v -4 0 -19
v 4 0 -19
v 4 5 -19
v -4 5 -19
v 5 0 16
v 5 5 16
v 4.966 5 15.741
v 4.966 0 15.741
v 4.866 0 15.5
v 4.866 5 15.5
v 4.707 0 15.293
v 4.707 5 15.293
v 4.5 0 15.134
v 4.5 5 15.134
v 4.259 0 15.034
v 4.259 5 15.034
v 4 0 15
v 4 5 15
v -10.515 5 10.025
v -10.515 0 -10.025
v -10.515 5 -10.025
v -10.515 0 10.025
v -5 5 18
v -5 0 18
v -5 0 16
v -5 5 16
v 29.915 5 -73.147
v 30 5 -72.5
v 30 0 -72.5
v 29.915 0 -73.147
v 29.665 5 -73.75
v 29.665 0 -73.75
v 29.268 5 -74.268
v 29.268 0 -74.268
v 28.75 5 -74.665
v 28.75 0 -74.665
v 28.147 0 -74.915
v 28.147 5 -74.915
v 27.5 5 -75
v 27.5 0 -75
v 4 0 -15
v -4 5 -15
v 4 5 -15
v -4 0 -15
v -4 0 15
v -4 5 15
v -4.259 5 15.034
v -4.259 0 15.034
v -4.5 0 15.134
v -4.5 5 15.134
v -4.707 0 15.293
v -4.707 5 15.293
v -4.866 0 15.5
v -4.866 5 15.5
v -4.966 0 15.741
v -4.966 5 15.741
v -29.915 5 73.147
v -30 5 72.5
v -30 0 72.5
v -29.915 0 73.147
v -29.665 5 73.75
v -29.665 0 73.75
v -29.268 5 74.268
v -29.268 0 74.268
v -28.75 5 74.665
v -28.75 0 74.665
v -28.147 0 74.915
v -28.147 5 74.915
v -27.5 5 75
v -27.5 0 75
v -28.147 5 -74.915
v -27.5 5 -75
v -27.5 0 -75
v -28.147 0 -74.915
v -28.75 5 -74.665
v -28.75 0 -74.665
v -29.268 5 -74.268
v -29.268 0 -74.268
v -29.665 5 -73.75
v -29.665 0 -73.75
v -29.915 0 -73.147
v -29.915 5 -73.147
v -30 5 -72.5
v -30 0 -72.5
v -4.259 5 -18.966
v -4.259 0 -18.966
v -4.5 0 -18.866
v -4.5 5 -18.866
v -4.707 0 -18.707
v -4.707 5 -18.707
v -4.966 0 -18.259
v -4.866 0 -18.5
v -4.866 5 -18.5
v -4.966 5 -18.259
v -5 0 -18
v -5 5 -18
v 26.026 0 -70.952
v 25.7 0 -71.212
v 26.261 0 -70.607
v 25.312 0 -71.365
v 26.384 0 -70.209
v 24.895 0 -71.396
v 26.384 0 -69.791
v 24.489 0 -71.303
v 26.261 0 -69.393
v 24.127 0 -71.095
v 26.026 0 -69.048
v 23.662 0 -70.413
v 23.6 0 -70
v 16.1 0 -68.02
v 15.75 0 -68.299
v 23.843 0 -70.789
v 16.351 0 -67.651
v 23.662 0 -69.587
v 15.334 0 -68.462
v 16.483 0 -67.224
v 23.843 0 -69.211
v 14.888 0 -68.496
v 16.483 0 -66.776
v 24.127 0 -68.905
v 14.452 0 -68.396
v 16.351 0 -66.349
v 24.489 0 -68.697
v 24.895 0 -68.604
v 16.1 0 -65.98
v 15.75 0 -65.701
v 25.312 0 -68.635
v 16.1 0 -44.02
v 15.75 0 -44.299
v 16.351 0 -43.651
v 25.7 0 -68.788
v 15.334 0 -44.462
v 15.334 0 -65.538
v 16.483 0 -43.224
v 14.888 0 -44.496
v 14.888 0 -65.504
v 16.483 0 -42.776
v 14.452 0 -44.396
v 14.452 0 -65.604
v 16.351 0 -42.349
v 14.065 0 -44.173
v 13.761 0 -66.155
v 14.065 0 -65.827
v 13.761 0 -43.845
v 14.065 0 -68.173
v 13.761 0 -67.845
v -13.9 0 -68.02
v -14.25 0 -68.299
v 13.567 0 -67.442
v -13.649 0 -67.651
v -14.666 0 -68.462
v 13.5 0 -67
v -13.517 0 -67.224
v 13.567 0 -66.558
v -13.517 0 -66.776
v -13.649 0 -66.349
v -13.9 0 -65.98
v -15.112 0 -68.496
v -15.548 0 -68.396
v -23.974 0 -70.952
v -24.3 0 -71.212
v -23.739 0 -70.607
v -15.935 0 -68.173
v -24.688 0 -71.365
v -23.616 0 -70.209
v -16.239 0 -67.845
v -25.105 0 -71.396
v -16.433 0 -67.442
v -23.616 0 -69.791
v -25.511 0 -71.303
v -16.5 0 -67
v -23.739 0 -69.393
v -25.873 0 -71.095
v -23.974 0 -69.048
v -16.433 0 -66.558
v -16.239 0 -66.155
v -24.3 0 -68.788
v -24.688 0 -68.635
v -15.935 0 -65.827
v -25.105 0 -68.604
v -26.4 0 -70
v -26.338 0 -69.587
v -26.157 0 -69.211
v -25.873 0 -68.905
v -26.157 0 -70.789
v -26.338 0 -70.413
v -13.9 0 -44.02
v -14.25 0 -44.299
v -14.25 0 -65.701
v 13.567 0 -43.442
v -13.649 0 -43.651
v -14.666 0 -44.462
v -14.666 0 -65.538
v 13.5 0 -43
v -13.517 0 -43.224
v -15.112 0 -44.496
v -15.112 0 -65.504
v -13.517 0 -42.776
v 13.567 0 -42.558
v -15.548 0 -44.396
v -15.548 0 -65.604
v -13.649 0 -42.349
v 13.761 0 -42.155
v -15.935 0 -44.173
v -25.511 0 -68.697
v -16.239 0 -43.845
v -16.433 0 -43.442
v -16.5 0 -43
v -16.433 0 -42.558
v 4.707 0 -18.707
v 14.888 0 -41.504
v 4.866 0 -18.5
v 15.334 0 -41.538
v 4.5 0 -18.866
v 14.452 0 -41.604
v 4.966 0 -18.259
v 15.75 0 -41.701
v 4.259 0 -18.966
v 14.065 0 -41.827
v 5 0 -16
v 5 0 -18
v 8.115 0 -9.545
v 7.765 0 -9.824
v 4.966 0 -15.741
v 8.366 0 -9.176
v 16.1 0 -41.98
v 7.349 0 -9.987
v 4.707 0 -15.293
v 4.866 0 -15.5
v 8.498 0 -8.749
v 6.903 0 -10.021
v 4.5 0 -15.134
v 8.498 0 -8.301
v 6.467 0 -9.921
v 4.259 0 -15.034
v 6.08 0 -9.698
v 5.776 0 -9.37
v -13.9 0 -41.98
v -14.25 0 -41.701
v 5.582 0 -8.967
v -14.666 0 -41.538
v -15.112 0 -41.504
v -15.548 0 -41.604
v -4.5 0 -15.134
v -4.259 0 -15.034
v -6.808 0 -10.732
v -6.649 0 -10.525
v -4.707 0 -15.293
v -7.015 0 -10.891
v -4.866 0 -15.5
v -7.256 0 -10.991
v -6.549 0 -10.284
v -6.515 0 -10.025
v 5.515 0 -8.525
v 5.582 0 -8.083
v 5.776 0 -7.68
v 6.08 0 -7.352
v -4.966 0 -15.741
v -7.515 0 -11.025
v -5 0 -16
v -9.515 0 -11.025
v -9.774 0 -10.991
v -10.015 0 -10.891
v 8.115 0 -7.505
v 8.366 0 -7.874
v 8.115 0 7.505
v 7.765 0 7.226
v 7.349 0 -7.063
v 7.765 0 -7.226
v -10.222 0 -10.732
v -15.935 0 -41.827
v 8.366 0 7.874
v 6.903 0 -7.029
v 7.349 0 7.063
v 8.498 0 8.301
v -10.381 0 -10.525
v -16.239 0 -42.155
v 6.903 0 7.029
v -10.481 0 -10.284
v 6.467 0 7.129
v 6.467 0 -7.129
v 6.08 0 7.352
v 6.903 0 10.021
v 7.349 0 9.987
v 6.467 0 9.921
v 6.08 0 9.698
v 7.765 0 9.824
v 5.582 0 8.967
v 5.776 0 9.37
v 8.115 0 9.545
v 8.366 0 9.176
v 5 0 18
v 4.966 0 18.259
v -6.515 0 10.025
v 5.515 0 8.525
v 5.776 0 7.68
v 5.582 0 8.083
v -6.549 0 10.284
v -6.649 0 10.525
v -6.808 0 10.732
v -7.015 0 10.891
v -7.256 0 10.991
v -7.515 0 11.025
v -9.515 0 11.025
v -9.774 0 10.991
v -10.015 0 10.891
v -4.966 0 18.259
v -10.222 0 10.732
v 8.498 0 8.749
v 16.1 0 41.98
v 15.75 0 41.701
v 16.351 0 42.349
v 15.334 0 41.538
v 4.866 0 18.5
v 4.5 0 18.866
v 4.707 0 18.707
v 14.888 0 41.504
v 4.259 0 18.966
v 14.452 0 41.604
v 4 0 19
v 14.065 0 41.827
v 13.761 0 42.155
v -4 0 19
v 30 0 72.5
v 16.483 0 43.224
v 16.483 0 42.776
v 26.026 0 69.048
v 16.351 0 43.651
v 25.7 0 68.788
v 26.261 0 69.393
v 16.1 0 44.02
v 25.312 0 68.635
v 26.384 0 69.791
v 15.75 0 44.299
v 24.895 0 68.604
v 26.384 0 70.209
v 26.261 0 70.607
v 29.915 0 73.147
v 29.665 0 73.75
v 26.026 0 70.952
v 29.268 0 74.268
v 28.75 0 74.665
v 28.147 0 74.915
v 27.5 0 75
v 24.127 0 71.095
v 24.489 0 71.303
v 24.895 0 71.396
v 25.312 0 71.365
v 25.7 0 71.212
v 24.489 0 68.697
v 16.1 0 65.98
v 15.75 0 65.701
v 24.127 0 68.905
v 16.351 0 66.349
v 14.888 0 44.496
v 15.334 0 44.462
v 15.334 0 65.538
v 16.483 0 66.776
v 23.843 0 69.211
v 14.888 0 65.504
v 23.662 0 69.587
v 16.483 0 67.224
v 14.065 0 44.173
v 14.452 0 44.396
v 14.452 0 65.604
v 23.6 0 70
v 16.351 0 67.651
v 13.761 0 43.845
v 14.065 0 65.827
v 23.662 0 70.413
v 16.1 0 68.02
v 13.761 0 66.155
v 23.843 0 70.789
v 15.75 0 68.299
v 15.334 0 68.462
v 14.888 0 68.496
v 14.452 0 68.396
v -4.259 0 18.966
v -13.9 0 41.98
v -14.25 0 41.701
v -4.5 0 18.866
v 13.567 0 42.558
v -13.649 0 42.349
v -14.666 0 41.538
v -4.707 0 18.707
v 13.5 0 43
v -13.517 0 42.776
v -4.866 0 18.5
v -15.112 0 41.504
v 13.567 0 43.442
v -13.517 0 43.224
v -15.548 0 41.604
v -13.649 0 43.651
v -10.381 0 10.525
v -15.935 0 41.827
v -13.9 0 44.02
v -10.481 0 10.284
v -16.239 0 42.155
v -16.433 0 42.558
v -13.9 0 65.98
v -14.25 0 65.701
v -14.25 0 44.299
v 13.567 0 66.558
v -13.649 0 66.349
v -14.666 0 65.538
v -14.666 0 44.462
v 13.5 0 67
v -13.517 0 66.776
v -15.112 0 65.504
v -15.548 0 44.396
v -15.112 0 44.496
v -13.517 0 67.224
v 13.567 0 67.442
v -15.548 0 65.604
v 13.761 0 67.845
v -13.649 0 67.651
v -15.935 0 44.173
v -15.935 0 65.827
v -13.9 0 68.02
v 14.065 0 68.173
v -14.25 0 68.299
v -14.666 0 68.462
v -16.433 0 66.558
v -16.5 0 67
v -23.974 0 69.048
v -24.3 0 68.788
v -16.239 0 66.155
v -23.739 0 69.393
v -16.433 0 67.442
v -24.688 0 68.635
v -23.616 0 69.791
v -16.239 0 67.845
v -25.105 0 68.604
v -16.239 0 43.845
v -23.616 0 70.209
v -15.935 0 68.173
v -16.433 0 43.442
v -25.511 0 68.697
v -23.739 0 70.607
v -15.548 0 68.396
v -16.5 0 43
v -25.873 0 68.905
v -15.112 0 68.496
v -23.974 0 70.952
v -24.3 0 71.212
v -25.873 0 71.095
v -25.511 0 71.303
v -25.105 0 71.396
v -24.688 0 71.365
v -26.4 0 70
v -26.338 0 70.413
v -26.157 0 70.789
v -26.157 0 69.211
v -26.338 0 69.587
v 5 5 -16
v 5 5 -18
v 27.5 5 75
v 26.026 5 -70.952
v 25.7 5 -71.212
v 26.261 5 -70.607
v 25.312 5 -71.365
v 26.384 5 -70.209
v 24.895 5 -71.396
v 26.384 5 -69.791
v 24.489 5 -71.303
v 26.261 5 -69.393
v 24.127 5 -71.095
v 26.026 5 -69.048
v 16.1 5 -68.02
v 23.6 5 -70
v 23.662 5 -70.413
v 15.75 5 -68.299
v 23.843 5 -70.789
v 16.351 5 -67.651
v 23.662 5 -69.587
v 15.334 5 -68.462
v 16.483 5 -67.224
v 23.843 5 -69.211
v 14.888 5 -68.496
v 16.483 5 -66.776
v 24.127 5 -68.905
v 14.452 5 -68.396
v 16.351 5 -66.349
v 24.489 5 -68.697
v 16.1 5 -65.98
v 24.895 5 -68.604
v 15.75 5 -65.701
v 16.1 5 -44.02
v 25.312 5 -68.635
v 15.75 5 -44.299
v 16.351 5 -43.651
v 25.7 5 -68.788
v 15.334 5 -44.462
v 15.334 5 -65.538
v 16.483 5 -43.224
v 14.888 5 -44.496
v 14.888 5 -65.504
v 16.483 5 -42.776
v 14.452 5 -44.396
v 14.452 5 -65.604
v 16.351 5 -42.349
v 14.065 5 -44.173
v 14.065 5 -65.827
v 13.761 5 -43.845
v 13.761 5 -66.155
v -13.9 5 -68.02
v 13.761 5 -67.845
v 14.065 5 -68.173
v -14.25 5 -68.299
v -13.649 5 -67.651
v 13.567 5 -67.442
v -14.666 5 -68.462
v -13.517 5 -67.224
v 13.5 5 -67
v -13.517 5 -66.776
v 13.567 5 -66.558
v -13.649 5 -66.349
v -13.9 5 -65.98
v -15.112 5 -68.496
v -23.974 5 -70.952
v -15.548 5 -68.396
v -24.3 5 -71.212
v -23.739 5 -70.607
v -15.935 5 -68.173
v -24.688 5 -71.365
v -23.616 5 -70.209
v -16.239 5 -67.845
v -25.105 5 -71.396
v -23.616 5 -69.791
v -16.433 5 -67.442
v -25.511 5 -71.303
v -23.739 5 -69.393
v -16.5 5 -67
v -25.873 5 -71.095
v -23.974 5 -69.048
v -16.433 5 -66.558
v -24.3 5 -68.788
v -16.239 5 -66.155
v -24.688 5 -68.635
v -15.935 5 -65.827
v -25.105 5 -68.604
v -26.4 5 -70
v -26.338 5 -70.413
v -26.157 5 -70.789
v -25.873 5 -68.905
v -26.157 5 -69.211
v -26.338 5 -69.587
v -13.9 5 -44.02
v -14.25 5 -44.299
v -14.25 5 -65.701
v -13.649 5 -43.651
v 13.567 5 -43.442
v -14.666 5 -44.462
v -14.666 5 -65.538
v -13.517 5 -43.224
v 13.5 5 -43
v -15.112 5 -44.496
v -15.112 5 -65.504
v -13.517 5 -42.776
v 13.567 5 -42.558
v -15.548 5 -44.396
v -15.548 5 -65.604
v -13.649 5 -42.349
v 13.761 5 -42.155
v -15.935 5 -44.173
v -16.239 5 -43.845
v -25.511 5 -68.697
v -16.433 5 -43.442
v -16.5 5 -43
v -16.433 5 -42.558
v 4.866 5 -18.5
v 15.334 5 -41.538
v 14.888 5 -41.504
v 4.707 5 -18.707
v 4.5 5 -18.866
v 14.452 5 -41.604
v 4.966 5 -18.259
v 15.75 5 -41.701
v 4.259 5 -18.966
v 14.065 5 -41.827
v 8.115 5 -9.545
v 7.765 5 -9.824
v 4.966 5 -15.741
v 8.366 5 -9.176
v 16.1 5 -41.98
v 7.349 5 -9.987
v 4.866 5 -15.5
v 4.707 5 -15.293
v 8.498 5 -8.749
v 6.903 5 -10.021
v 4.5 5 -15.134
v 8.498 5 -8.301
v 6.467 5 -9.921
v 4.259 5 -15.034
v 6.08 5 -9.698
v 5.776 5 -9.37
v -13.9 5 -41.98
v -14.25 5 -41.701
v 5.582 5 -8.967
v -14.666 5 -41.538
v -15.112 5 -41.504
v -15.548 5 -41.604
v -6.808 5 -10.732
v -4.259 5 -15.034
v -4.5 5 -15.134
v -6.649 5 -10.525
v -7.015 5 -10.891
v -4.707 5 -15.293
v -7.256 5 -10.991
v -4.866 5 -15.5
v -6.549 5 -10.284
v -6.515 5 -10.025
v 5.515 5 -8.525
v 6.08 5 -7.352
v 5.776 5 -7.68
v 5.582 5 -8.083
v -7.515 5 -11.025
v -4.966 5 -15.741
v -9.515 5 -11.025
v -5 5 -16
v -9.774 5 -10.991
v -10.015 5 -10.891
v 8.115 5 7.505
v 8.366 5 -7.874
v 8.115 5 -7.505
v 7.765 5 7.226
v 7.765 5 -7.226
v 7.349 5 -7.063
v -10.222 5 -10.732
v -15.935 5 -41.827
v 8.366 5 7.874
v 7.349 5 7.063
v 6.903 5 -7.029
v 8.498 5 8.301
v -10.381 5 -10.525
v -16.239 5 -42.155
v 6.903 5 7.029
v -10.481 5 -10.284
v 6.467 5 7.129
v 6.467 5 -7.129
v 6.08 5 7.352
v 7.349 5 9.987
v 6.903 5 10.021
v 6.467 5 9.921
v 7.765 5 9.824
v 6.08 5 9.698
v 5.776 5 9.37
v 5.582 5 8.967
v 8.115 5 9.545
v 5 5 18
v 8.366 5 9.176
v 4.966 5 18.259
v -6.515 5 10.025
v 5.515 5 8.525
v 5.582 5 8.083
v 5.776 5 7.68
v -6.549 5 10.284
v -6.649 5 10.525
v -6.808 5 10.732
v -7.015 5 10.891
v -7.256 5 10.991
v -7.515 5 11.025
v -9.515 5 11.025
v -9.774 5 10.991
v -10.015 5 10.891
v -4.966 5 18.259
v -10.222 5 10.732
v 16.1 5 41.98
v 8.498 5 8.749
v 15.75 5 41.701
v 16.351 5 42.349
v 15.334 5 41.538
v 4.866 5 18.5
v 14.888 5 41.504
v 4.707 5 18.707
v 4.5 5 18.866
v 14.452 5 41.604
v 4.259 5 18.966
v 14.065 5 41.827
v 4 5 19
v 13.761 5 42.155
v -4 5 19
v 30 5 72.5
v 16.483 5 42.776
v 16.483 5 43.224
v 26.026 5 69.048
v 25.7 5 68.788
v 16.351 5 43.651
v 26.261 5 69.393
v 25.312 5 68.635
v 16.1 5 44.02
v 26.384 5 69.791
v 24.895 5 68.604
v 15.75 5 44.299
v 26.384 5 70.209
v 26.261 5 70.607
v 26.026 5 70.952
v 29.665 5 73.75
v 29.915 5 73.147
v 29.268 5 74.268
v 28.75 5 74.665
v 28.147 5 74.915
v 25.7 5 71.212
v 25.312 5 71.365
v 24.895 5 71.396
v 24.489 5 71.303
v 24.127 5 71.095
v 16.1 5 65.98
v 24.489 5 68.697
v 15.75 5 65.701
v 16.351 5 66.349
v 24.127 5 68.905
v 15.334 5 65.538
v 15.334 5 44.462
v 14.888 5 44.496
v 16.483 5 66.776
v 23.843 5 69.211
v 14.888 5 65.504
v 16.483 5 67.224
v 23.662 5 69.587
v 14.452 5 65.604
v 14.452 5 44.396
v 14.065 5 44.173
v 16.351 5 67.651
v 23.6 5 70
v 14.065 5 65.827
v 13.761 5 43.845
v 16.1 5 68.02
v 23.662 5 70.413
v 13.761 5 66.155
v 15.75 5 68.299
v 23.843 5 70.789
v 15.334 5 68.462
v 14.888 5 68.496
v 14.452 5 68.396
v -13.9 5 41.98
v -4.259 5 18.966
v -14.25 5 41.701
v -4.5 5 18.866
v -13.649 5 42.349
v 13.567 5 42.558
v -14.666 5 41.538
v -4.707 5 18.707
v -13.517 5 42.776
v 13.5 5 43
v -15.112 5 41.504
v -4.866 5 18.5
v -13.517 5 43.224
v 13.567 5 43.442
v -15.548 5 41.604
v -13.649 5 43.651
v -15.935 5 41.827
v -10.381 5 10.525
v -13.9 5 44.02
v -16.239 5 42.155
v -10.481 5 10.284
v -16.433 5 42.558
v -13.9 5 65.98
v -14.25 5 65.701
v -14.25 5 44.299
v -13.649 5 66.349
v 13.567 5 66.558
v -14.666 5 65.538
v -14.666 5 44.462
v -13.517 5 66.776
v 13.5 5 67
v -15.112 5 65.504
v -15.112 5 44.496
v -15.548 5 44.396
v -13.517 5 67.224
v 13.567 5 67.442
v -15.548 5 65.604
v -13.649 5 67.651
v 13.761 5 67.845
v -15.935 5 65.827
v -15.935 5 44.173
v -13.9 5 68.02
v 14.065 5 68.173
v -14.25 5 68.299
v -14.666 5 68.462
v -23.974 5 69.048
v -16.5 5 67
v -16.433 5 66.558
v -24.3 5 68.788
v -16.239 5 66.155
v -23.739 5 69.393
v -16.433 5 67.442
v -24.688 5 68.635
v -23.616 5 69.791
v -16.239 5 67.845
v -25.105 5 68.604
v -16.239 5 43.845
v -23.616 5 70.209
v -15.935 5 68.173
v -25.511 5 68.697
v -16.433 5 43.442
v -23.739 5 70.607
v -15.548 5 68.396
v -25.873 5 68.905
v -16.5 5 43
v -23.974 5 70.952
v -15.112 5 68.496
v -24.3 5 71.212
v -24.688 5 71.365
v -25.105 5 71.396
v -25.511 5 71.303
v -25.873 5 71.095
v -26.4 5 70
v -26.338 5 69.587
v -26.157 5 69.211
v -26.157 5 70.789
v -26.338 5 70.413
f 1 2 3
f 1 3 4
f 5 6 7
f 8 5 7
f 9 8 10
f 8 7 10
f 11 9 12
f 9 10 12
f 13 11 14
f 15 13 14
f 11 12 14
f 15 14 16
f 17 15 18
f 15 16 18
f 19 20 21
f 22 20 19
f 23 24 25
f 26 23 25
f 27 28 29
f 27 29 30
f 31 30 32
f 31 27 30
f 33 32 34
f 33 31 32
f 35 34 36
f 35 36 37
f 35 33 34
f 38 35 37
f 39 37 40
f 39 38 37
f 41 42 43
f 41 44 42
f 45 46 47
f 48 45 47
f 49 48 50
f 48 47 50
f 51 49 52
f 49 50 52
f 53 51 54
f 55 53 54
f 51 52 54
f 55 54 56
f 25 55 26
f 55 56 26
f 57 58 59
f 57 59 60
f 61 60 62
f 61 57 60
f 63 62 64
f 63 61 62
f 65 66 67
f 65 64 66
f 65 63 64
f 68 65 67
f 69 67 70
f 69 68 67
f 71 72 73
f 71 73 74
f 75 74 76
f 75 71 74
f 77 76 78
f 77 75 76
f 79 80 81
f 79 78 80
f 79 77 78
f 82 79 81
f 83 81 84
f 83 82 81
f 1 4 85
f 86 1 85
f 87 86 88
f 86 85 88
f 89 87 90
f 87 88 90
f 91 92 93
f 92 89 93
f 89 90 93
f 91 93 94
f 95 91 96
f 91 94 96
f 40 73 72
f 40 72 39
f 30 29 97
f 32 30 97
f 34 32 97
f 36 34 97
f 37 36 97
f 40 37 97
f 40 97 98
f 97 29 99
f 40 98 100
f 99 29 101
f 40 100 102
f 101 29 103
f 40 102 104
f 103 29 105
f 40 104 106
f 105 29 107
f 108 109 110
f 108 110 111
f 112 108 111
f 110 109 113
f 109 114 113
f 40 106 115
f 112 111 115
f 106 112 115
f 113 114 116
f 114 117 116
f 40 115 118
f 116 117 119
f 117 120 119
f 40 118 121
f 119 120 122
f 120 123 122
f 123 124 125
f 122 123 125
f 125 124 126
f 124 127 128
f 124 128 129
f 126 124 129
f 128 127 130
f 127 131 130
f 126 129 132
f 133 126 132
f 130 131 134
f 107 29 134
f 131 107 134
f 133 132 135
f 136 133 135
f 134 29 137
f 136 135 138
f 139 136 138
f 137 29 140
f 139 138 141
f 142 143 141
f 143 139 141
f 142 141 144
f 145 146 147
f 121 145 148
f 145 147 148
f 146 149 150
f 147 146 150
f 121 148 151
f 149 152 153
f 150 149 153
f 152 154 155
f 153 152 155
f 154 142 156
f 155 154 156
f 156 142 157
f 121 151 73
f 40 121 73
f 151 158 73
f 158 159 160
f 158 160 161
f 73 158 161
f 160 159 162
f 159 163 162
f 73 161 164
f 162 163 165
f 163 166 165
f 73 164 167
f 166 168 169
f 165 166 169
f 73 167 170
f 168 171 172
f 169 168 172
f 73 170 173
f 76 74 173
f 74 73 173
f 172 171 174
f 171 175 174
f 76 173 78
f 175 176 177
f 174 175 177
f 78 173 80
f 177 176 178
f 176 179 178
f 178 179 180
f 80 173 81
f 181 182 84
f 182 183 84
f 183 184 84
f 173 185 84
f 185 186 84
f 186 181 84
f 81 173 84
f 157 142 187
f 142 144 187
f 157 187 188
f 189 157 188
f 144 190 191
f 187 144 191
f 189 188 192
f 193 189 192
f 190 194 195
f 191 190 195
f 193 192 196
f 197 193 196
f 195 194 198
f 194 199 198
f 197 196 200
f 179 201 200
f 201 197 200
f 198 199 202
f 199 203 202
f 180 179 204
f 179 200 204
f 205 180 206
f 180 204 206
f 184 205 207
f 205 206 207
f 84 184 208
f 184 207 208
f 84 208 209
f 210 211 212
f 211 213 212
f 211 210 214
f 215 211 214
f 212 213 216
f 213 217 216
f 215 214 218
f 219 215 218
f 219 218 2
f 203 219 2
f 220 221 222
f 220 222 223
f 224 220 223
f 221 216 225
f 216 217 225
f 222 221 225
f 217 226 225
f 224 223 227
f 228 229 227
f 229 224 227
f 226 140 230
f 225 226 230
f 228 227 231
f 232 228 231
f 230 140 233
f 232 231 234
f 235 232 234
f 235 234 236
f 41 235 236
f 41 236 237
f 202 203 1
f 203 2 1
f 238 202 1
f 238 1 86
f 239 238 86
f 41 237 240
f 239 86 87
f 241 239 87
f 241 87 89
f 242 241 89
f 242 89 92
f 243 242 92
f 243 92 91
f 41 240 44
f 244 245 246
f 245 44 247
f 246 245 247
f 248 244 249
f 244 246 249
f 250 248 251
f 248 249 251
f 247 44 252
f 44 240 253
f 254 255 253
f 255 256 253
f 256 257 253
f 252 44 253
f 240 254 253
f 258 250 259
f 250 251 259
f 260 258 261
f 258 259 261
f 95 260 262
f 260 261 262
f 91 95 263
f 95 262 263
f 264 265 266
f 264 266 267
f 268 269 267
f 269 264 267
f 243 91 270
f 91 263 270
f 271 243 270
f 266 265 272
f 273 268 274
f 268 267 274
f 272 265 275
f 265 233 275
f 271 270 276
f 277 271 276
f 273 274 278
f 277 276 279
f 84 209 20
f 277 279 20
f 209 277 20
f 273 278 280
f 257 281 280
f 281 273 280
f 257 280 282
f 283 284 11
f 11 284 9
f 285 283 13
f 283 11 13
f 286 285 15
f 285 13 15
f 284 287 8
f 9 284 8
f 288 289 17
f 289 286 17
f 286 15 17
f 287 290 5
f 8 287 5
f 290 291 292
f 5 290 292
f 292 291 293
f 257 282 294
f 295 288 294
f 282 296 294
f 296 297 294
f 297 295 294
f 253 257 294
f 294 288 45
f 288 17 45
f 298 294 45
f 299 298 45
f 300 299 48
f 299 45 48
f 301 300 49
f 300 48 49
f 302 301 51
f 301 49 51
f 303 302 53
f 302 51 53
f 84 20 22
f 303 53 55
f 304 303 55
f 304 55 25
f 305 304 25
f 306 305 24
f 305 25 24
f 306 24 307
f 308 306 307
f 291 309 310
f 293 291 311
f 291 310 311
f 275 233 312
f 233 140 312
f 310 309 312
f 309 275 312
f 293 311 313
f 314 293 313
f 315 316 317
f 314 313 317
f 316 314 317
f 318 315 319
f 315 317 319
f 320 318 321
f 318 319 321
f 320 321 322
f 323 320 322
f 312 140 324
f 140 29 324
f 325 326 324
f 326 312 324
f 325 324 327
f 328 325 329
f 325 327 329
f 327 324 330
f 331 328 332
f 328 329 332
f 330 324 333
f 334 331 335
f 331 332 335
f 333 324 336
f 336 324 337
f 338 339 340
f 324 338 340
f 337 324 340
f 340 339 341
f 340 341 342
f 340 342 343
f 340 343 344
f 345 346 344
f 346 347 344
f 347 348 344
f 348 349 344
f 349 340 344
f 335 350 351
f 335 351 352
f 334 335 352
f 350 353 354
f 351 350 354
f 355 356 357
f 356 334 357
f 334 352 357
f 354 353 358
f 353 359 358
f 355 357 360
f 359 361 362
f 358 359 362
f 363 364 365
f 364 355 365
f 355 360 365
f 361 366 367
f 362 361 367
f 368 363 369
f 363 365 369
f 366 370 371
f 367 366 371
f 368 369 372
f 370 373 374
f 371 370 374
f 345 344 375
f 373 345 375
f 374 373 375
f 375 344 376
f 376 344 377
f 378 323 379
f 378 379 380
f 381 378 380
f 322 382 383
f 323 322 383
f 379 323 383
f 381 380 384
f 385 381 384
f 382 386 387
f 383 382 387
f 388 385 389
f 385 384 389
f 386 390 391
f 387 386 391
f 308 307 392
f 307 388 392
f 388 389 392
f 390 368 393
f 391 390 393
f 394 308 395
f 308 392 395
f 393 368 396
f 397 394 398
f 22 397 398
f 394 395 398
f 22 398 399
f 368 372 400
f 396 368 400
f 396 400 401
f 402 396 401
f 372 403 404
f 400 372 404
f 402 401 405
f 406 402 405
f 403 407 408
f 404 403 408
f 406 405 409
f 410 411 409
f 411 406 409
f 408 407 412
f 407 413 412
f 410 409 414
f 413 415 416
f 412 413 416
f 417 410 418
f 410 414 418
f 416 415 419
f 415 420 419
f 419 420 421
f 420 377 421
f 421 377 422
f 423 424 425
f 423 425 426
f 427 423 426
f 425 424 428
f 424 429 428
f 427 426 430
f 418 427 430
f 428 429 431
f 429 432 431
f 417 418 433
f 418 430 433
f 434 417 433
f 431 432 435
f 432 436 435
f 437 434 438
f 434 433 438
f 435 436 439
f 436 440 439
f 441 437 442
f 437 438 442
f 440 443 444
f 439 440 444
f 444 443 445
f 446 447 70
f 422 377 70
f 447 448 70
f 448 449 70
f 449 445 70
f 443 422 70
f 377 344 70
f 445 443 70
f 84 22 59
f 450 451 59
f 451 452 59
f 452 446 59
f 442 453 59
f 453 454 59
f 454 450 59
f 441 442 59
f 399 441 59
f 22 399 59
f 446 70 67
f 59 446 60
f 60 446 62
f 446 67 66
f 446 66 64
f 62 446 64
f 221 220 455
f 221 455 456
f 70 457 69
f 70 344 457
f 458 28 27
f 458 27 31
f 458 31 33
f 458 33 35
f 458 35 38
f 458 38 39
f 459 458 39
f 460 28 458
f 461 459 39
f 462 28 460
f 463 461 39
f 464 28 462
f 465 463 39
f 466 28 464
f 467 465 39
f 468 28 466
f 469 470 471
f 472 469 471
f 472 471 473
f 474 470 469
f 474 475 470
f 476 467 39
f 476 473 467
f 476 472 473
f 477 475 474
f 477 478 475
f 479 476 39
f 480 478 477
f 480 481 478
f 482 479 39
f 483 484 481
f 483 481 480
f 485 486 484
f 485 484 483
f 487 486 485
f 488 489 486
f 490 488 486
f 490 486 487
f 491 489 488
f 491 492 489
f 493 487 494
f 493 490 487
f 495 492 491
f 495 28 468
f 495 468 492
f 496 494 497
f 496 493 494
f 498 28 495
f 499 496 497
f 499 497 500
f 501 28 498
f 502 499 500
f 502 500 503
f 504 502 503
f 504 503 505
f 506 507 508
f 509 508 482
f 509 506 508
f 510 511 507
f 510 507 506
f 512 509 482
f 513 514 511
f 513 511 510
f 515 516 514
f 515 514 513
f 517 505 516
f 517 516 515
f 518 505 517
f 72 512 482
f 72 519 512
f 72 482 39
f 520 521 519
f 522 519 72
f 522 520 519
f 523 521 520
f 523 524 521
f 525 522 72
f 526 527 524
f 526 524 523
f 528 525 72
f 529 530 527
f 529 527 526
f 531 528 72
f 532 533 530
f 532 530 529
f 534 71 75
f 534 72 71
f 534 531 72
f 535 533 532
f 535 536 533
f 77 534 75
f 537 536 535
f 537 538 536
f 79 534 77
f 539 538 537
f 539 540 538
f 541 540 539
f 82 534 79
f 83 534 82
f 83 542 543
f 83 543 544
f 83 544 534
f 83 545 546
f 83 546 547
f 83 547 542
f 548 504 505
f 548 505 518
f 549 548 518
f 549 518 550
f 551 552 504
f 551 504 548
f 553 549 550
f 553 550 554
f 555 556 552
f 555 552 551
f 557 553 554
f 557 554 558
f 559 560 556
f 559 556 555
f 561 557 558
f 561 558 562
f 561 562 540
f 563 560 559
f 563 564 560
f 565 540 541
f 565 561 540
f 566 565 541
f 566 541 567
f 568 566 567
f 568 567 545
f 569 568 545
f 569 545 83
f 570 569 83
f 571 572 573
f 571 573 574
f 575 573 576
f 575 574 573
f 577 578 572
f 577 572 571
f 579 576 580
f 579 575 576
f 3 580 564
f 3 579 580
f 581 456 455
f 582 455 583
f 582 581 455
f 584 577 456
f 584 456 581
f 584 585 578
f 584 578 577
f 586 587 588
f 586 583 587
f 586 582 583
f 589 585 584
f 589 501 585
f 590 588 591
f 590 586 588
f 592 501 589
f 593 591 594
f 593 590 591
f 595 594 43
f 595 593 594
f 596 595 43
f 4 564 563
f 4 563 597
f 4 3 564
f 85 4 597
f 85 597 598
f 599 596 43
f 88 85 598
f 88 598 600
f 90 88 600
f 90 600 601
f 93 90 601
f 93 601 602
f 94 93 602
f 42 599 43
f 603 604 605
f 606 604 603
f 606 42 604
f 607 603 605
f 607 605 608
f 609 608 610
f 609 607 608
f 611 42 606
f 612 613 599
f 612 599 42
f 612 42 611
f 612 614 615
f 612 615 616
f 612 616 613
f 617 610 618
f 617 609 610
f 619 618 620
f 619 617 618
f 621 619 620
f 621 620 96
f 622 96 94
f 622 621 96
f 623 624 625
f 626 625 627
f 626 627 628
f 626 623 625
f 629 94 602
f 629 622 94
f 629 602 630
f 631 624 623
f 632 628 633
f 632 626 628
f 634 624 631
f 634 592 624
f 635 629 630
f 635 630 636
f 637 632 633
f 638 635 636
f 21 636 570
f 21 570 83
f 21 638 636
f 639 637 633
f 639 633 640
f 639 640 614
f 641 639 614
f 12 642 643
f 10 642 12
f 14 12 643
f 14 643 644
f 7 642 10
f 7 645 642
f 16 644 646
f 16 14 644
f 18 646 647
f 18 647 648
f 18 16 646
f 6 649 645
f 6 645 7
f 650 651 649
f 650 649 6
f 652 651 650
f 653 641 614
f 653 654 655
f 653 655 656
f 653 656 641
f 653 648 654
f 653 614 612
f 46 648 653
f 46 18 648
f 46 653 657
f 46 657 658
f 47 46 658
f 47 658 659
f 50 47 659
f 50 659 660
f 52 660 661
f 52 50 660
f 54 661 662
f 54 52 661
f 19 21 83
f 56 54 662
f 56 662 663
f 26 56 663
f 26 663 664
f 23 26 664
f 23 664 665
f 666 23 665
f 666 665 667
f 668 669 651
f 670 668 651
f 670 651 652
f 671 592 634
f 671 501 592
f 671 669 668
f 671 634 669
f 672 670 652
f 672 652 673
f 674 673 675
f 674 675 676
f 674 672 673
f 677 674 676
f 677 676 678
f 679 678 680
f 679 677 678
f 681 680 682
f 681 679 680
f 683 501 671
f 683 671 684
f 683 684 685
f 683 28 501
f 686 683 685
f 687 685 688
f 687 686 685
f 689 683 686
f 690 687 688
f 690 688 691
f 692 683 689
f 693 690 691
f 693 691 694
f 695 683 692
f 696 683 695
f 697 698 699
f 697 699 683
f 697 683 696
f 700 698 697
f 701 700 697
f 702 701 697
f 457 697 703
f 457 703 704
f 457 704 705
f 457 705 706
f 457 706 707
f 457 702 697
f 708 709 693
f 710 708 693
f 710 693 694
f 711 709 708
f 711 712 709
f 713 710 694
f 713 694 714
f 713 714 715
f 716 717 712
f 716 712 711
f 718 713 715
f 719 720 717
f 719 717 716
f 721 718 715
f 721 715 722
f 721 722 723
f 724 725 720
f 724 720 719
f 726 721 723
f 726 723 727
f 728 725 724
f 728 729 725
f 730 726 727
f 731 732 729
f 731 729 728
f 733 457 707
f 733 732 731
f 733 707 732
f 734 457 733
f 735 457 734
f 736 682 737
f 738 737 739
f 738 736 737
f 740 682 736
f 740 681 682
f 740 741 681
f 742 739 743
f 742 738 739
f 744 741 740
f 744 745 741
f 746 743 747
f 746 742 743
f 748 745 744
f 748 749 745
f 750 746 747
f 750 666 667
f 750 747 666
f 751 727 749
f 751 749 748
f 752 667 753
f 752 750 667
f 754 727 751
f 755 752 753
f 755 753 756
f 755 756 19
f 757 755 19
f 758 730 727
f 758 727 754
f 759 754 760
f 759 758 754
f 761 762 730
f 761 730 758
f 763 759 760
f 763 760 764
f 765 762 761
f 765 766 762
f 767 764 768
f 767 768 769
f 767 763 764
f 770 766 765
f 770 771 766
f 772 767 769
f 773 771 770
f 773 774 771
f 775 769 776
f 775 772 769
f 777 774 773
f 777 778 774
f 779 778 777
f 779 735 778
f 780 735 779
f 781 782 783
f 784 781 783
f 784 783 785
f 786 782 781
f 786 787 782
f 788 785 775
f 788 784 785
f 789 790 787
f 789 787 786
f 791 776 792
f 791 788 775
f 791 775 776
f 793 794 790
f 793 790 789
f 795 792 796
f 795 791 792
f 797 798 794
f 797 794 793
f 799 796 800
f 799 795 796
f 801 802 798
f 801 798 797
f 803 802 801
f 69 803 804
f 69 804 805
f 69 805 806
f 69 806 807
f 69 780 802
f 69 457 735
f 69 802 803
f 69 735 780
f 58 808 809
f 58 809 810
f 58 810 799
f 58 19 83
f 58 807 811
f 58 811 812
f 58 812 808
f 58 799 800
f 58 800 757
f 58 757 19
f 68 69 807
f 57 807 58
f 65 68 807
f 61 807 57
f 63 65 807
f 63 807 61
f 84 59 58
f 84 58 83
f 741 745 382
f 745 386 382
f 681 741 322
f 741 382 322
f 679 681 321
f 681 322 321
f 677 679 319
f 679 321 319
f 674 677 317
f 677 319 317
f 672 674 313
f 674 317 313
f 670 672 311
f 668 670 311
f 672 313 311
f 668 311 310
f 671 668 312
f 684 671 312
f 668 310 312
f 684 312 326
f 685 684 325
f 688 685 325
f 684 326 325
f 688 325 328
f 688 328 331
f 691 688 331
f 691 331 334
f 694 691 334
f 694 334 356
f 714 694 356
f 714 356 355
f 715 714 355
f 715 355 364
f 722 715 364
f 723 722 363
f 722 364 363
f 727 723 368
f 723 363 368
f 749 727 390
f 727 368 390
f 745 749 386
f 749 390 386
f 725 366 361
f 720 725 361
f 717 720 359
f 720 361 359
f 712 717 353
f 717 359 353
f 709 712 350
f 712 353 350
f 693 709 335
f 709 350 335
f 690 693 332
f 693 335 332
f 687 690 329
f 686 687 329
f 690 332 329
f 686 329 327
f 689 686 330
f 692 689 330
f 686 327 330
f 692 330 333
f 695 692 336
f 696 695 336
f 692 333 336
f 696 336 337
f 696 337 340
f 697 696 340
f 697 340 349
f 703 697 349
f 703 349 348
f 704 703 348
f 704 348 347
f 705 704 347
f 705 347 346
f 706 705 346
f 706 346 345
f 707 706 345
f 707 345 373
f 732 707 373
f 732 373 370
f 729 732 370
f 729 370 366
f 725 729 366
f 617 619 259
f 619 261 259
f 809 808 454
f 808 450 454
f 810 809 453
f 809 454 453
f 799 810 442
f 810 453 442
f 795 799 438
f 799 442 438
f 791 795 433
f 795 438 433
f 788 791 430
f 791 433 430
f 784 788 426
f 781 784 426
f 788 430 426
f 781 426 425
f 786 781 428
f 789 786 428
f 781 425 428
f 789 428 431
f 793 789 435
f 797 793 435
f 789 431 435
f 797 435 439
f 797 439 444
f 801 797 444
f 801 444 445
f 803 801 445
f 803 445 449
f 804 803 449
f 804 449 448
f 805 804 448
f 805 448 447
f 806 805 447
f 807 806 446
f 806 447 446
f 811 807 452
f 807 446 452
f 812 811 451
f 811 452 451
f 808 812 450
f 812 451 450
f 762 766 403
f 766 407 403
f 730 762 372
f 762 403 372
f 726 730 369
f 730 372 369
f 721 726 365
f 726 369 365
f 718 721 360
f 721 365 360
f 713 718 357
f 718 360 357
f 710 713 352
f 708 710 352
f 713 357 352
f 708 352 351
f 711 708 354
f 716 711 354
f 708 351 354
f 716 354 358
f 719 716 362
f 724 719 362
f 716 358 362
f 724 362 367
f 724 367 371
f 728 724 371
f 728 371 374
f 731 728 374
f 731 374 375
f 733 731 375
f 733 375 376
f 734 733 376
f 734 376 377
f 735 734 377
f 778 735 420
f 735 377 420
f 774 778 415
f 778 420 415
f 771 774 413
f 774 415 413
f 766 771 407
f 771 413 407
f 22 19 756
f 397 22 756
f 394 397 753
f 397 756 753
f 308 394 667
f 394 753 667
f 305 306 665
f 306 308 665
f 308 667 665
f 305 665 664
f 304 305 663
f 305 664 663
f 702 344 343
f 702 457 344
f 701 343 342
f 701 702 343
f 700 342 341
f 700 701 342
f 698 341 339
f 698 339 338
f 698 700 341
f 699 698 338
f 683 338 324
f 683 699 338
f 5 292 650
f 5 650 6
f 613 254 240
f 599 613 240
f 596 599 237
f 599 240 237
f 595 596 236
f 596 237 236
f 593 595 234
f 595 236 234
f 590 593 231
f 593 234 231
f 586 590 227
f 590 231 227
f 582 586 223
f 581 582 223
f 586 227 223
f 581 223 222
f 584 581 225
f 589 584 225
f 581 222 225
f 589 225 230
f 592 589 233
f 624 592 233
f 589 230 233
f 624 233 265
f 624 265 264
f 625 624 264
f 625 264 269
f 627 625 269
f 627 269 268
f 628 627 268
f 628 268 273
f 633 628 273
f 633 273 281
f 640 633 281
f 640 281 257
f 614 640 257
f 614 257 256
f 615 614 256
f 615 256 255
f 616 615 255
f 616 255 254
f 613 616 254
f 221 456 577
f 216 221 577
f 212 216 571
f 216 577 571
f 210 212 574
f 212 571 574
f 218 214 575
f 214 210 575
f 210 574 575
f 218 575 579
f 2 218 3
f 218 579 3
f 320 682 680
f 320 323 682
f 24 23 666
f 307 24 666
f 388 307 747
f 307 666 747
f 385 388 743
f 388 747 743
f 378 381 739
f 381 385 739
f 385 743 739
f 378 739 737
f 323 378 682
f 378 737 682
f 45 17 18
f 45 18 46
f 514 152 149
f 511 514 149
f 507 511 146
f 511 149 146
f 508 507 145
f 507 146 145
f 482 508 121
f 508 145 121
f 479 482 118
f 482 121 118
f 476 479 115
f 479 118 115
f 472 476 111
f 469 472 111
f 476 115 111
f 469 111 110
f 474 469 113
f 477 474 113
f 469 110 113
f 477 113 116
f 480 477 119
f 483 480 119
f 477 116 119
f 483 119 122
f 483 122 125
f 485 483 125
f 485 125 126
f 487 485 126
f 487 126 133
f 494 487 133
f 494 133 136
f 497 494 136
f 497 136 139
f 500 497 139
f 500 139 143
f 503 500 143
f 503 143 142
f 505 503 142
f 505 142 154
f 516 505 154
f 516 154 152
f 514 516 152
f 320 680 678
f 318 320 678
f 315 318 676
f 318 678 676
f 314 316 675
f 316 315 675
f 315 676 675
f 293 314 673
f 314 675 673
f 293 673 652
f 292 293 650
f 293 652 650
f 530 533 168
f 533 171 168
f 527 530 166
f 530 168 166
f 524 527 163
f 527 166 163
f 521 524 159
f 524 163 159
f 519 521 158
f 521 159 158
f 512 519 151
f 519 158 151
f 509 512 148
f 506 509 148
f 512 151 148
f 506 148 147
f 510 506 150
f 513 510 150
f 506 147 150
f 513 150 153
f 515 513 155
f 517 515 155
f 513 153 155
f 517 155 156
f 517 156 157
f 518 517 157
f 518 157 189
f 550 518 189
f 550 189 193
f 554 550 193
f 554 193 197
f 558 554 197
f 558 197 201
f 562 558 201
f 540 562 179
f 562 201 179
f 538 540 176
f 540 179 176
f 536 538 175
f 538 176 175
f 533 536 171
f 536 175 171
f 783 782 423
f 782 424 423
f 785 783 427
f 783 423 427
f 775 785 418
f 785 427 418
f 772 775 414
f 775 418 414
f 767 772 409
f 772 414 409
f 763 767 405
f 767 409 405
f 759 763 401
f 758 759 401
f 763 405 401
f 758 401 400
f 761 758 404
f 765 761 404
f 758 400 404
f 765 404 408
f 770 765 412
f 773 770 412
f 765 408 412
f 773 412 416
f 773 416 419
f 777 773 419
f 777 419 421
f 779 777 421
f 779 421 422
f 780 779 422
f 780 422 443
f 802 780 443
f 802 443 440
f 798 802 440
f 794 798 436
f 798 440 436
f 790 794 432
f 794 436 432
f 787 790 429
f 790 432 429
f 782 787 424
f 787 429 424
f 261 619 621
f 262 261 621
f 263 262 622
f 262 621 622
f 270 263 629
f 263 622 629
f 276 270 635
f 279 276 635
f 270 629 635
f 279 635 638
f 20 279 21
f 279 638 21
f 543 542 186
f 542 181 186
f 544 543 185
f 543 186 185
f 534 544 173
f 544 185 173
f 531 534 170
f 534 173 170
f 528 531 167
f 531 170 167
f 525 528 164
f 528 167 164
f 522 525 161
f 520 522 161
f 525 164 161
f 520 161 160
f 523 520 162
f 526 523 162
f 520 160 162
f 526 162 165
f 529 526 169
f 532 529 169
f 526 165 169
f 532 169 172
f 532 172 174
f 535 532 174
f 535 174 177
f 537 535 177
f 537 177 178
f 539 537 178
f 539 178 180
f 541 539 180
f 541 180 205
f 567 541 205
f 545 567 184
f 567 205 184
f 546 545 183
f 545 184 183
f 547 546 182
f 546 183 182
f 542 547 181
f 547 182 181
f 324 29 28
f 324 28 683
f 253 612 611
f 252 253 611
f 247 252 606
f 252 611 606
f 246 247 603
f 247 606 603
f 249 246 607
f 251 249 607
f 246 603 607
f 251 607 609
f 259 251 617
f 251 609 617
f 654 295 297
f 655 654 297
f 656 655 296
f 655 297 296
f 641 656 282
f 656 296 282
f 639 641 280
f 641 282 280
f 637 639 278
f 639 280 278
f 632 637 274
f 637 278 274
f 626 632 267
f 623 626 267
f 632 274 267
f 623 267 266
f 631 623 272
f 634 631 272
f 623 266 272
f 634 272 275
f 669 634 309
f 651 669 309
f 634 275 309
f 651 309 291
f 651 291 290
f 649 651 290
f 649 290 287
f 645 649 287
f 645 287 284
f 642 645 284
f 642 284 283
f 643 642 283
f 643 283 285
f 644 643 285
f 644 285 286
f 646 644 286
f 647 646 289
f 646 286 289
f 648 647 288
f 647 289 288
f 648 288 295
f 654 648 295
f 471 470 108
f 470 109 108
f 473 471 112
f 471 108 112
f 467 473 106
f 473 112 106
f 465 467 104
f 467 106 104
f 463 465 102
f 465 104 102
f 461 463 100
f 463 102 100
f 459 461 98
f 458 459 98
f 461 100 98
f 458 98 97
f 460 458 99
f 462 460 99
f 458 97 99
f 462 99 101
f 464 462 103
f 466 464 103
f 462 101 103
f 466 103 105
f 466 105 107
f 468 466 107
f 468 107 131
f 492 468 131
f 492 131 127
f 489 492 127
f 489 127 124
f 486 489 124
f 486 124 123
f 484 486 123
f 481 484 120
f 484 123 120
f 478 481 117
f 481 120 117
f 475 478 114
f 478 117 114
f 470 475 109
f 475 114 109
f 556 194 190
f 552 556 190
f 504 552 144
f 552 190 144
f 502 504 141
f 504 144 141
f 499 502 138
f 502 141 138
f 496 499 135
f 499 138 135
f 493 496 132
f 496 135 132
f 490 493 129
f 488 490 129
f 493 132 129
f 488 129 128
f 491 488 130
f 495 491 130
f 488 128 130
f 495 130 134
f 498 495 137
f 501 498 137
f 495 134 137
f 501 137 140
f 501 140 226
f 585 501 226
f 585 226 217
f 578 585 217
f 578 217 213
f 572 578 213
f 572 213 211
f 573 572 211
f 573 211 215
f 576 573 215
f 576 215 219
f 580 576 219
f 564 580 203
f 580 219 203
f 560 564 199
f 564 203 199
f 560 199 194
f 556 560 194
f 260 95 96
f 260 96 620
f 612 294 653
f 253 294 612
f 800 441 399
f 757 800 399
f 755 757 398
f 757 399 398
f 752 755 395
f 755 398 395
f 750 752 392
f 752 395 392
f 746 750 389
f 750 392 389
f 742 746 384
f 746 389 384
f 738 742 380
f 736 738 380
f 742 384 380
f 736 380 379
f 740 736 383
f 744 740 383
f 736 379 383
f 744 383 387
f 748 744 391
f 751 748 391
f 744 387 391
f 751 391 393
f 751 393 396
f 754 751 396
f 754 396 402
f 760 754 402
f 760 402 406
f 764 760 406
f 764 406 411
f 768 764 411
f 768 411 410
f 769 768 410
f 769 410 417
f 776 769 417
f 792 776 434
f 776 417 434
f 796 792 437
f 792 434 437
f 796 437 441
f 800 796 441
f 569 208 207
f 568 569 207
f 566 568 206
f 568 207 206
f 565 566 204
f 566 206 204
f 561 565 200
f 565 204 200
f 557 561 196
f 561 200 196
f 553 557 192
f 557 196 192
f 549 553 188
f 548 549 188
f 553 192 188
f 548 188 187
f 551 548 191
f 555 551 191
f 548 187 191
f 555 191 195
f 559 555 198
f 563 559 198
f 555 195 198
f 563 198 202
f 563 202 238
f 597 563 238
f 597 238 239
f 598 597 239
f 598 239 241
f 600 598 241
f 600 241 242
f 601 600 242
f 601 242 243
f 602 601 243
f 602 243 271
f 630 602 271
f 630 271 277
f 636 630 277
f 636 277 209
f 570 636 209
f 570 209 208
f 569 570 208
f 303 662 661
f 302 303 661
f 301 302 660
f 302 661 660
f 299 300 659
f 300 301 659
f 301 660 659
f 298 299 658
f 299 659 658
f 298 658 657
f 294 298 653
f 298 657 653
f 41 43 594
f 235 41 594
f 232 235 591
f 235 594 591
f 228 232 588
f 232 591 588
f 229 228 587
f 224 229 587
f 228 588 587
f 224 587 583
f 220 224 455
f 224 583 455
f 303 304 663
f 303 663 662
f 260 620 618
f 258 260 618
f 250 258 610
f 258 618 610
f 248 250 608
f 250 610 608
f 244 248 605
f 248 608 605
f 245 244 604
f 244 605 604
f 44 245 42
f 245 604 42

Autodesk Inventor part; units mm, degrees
ref_plane "YZ Plane" through (0, 0, 0) normal (1, 0, 0) x (0, 1, 0)
ref_plane "XZ Plane" through (0, 0, 0) normal (0, 1, 0) x (-1, 0, 0)
ref_plane "XY Plane" through (0, 0, 0) normal (0, 0, 1) x (1, 0, 0)
sketch "Sketch1" plane through (0, 0, 0) normal (0, 1, 0) x (-1, 0, 0)
  line L0 (-30, 75) -> (30, 75)
  line L1 (30, 75) -> (30, -75)
  line L2 (30, -75) -> (-30, -75)
  line L3 (-30, -75) -> (-30, 75)
  line L4 (30, 75) -> (25, 75)
  line L5 (25, 75) -> (25, 70)
  line L6 (25, 70) -> (30, 70)
  line L7 (30, 70) -> (30, 75)
  line L8 (-30, 75) -> (-25, 75)
  line L9 (-25, 75) -> (-25, 70)
  line L10 (-25, 70) -> (-30, 70)
  line L11 (-30, 70) -> (-30, 75)
  line L12 (30, -75) -> (25, -75)
  line L13 (25, -75) -> (25, -70)
  line L14 (25, -70) -> (30, -70)
  line L15 (30, -70) -> (30, -75)
  line L16 (-30, -75) -> (-25, -75)
  line L17 (-25, -75) -> (-25, -70)
  line L18 (-25, -70) -> (-30, -70)
  line L19 (-30, -70) -> (-30, -75)
  circle A0 centre (25, 70) radius 1.4
  circle A1 centre (-25, 70) radius 1.4
  circle A2 centre (25, -70) radius 1.4
  circle A3 centre (-25, -70) radius 1.4
  line L20 (0, 75) -> (13, 75)
  line L21 (0, 75) -> (-13, 75)
  line L22 (-9.515, 11.025) -> (9.515, 11.025)
  line L23 (9.515, 11.025) -> (9.515, -11.025)
  line L24 (9.515, -11.025) -> (-9.515, -11.025)
  line L25 (-9.515, -11.025) -> (-9.515, 11.025)
  line L26 (-9.515, 11.025) -> (9.515, -11.025) construction
  line L27 (9.515, 11.025) -> (-9.515, -11.025) construction
  line L28 (-9.515, -11.025) -> (-7.015, -11.025)
  line L29 (-7.015, -11.025) -> (-7.015, -8.525)
  line L30 (-7.015, -8.525) -> (-9.515, -8.525)
  line L31 (-9.515, -8.525) -> (-9.515, -11.025)
  line L32 (-9.515, 11.025) -> (-7.015, 11.025)
  line L33 (-7.015, 11.025) -> (-7.015, 8.525)
  line L34 (-7.015, 8.525) -> (-9.515, 8.525)
  line L35 (-9.515, 8.525) -> (-9.515, 11.025)
  circle A4 centre (-7.015, 8.525) radius 1.5
  circle A5 centre (-7.015, -8.525) radius 1.5
  line L36 (9.515, 0) -> (8.515, 0)
  line L37 (6.515, -11.025) -> (10.515, -11.025)
  line L38 (10.515, -11.025) -> (10.515, 11.025)
  line L39 (10.515, 11.025) -> (6.515, 11.025)
  line L40 (6.515, 11.025) -> (6.515, -11.025)
  line L41 (6.515, -11.025) -> (10.515, 11.025) construction
  line L42 (10.515, -11.025) -> (6.515, 11.025) construction
  line L43 (0, -75) -> (-20, -75)
  line L44 (-20, -75) -> (-20, -35)
  line L45 (-20, -35) -> (0, -35)
  line L46 (0, -35) -> (0, -75)
  line L47 (0, -75) -> (20, -75)
  line L48 (20, -75) -> (20, -35)
  line L49 (20, -35) -> (0, -35)
  line L50 (0, -35) -> (0, -75)
  line L51 (0, 75) -> (-20, 75)
  line L52 (-20, 75) -> (-20, 35)
  line L53 (-20, 35) -> (0, 35)
  line L54 (0, 35) -> (0, 75)
  line L55 (0, 35) -> (20, 35)
  line L56 (20, 35) -> (20, 75)
  line L57 (20, 75) -> (0, 75)
  line L58 (0, 75) -> (0, 35)
  line L59 (-20, -35) -> (20, -35)
  line L60 (20, -35) -> (20, -43)
  line L61 (20, -43) -> (-20, -43)
  line L62 (-20, -43) -> (-20, -35)
  line L63 (-20, 35) -> (20, 35)
  line L64 (20, 35) -> (20, 43)
  line L65 (20, 43) -> (-20, 43)
  line L66 (-20, 43) -> (-20, 35)
  line L67 (-20, 43) -> (-15, 43)
  line L68 (-15, 43) -> (15, 43)
  line L69 (15, 43) -> (15, 67)
  line L70 (15, 67) -> (-15, 67)
  line L71 (-15, 67) -> (-15, 43)
  line L72 (0, -43) -> (-15, -43)
  line L73 (15, -43) -> (15, -67)
  line L74 (15, -67) -> (-15, -67)
  line L75 (-15, -67) -> (-15, -43)
  circle A6 centre (-15, -67) radius 1.5
  circle A7 centre (15, -67) radius 1.5
  circle A8 centre (-15, -43) radius 1.5
  circle A9 centre (15, -43) radius 1.5
  circle A10 centre (-15, 67) radius 1.5
  circle A11 centre (-15, 43) radius 1.5
  circle A12 centre (15, 43) radius 1.5
  circle A13 centre (15, 67) radius 1.5
  line L76 (-20, 35) -> (20, 35)
  line L77 (20, 35) -> (20, 19)
  line L78 (20, 19) -> (-20, 19)
  line L79 (-20, 19) -> (-20, 35)
  line L80 (20, -35) -> (-20, -35)
  line L81 (-20, -35) -> (-20, -19)
  line L82 (-20, -19) -> (20, -19)
  line L83 (20, -19) -> (20, -35)
  line L84 (0, 19) -> (5, 19)
  line L85 (5, 19) -> (5, 15)
  line L86 (5, 15) -> (0, 15)
  line L87 (0, 15) -> (0, 19)
  line L88 (0, 19) -> (-5, 19)
  line L89 (-5, 19) -> (-5, 15)
  line L90 (-5, 15) -> (0, 15)
  line L91 (0, 15) -> (0, 19)
  line L92 (0, -19) -> (5, -19)
  line L93 (5, -19) -> (5, -15)
  line L94 (5, -15) -> (0, -15)
  line L95 (0, -15) -> (0, -19)
  line L96 (0, -15) -> (-5, -15)
  line L97 (-5, -15) -> (-5, -19)
  line L98 (-5, -19) -> (0, -19)
  line L99 (0, -19) -> (0, -15)
  point P0 (0, 0)
  point P1 (6.515, 11.025)
  point P2 (6.515, -11.025)
  point P3 (-5, 19)
  point P4 (5, 19)
  point P5 (0, 15)
  dimension "d0" = 60
  dimension "d1" = 150
  dimension "d2" = 5
  dimension "d3" = 5
  dimension "d4" = 5
  dimension "d5" = 5
  dimension "d6" = 5
  dimension "d7" = 5
  dimension "d8" = 5
  dimension "d9" = 5
  dimension "d10" = 2.8
  dimension "d11" = 2.8
  dimension "d39" = 19.03
  dimension "d40" = 22.05
  dimension "d41" = 2.5
  dimension "d42" = 2.5
  dimension "d43" = 2.5
  dimension "d44" = 2.5
  dimension "d45" = 3
  dimension "d46" = 3
  dimension "d47" = 1
  dimension "d48" = 4
  dimension "d54" = 20
  dimension "d55" = 40
  dimension "d56" = 20
  dimension "d57" = 20
  dimension "d58" = 40
  dimension "d59" = 20
  dimension "d60" = 8
  dimension "d61" = 8
  dimension "d62" = 5
  dimension "d63" = 30
  dimension "d64" = 24
  dimension "d65" = 24
  dimension "d66" = 3
  dimension "d67" = 3
  dimension "d68" = 3
  dimension "d69" = 3
  dimension "d70" = 3
  dimension "d71" = 3
  dimension "d72" = 3
  dimension "d75" = 16
  dimension "d76" = 16
  dimension "d77" = 5
  dimension "d78" = 4
  dimension "d79" = 5
  dimension "d80" = 5
  dimension "d81" = 4
  dimension "d82" = 5
extrude "Extrusion1" add sketch "Sketch1" along normal blind 5 contours L0 L9 A1 L10 L3 | L0 L52 L79 L78 L89 L90 L86 L85 L77 L56 L5 A0 L6 L1 L14 A2 L13 L2 L48 L83 L82 L93 L94 L96 L97 L81 L44 L17 A3 L18 L3 L10 A1 L9 | L0 L54 L70 A10 L71 A11 L65 L52 | L18 A3 L17 L2 L3 | L65 A11 L54 L53 L52 | L0 L56 L65 A12 L69 A13 L70 L54 | L53 L55 L77 L78 L79 | A11 L71 L65 | L65 A11 | L70 A13 L69 A12 L65 L54 | L54 L65 A11 L71 A10 L70 | L54 L65 A12 L56 L55 | L71 A11 L65 | L44 L61 A8 L75 A6 L74 L46 L2 | A13 L69 L70 | L70 L69 A13 | A10 L71 L70 | L70 L71 A10 | L46 L74 A7 L73 A9 L61 L48 L2 | L44 L45 L46 L61 A8 | L0 L1 L6 A0 L5 | A12 L69 L65 | L65 A12 | L74 A6 L75 A8 L61 L46 | L46 L61 A9 L73 A7 L74 | L81 L82 L83 L49 L45 | A8 L61 | L61 L75 A8 | L65 L69 A12 | L13 A2 L14 L1 L2 | L61 A9 L46 L49 L48 | A7 L73 L74 | L74 L73 A7 | A6 L75 L74 | L74 L75 A6 | L61 A8 L75 | A9 L73 L61 | L61 A9 | L61 L73 A9 | L22 L33 A4 L34 L25 | L22 L40 L24 L29 A5 L30 L25 L34 A4 L33 | L30 A5 L29 L24 L25
fillet "Fillet1" radius 2.5 4 edges at (-30, 2.5, 75) (-30, 2.5, -75) (30, 2.5, -75) (30, 2.5, 75)
fillet "Fillet2" radius 1 2 edges at (-6.515, 2.5, 11.025) (-10.515, 2.5, 11.025)
fillet "Fillet3" radius 1 2 edges at (-6.515, 2.5, -11.025) (-10.515, 2.5, -11.025)
extrude "Extrusion2" cut sketch "Sketch1" along normal blind 5 contours A11 L71 L65 | L65 A11 | L71 A11 L65 | A13 L69 L70 | L70 L69 A13 | A10 L71 L70 | L70 L71 A10 | A12 L69 L65 | L65 A12 | A8 L61 | L61 L75 A8 | L65 L69 A12 | A7 L73 L74 | L74 L73 A7 | A6 L75 L74 | L74 L75 A6 | L61 A8 L75 | A9 L73 L61 | L61 A9 | L61 L73 A9
fillet "Fillet4" radius 1 8 edges at (-5, 2.5, -15) (5, 2.5, -15) (5, 2.5, -19) (-5, 2.5, -19) (-5, 2.5, 19) (5, 2.5, 19) (5, 2.5, 15) (-5, 2.5, 15)
properties part number "DeDuoi"
